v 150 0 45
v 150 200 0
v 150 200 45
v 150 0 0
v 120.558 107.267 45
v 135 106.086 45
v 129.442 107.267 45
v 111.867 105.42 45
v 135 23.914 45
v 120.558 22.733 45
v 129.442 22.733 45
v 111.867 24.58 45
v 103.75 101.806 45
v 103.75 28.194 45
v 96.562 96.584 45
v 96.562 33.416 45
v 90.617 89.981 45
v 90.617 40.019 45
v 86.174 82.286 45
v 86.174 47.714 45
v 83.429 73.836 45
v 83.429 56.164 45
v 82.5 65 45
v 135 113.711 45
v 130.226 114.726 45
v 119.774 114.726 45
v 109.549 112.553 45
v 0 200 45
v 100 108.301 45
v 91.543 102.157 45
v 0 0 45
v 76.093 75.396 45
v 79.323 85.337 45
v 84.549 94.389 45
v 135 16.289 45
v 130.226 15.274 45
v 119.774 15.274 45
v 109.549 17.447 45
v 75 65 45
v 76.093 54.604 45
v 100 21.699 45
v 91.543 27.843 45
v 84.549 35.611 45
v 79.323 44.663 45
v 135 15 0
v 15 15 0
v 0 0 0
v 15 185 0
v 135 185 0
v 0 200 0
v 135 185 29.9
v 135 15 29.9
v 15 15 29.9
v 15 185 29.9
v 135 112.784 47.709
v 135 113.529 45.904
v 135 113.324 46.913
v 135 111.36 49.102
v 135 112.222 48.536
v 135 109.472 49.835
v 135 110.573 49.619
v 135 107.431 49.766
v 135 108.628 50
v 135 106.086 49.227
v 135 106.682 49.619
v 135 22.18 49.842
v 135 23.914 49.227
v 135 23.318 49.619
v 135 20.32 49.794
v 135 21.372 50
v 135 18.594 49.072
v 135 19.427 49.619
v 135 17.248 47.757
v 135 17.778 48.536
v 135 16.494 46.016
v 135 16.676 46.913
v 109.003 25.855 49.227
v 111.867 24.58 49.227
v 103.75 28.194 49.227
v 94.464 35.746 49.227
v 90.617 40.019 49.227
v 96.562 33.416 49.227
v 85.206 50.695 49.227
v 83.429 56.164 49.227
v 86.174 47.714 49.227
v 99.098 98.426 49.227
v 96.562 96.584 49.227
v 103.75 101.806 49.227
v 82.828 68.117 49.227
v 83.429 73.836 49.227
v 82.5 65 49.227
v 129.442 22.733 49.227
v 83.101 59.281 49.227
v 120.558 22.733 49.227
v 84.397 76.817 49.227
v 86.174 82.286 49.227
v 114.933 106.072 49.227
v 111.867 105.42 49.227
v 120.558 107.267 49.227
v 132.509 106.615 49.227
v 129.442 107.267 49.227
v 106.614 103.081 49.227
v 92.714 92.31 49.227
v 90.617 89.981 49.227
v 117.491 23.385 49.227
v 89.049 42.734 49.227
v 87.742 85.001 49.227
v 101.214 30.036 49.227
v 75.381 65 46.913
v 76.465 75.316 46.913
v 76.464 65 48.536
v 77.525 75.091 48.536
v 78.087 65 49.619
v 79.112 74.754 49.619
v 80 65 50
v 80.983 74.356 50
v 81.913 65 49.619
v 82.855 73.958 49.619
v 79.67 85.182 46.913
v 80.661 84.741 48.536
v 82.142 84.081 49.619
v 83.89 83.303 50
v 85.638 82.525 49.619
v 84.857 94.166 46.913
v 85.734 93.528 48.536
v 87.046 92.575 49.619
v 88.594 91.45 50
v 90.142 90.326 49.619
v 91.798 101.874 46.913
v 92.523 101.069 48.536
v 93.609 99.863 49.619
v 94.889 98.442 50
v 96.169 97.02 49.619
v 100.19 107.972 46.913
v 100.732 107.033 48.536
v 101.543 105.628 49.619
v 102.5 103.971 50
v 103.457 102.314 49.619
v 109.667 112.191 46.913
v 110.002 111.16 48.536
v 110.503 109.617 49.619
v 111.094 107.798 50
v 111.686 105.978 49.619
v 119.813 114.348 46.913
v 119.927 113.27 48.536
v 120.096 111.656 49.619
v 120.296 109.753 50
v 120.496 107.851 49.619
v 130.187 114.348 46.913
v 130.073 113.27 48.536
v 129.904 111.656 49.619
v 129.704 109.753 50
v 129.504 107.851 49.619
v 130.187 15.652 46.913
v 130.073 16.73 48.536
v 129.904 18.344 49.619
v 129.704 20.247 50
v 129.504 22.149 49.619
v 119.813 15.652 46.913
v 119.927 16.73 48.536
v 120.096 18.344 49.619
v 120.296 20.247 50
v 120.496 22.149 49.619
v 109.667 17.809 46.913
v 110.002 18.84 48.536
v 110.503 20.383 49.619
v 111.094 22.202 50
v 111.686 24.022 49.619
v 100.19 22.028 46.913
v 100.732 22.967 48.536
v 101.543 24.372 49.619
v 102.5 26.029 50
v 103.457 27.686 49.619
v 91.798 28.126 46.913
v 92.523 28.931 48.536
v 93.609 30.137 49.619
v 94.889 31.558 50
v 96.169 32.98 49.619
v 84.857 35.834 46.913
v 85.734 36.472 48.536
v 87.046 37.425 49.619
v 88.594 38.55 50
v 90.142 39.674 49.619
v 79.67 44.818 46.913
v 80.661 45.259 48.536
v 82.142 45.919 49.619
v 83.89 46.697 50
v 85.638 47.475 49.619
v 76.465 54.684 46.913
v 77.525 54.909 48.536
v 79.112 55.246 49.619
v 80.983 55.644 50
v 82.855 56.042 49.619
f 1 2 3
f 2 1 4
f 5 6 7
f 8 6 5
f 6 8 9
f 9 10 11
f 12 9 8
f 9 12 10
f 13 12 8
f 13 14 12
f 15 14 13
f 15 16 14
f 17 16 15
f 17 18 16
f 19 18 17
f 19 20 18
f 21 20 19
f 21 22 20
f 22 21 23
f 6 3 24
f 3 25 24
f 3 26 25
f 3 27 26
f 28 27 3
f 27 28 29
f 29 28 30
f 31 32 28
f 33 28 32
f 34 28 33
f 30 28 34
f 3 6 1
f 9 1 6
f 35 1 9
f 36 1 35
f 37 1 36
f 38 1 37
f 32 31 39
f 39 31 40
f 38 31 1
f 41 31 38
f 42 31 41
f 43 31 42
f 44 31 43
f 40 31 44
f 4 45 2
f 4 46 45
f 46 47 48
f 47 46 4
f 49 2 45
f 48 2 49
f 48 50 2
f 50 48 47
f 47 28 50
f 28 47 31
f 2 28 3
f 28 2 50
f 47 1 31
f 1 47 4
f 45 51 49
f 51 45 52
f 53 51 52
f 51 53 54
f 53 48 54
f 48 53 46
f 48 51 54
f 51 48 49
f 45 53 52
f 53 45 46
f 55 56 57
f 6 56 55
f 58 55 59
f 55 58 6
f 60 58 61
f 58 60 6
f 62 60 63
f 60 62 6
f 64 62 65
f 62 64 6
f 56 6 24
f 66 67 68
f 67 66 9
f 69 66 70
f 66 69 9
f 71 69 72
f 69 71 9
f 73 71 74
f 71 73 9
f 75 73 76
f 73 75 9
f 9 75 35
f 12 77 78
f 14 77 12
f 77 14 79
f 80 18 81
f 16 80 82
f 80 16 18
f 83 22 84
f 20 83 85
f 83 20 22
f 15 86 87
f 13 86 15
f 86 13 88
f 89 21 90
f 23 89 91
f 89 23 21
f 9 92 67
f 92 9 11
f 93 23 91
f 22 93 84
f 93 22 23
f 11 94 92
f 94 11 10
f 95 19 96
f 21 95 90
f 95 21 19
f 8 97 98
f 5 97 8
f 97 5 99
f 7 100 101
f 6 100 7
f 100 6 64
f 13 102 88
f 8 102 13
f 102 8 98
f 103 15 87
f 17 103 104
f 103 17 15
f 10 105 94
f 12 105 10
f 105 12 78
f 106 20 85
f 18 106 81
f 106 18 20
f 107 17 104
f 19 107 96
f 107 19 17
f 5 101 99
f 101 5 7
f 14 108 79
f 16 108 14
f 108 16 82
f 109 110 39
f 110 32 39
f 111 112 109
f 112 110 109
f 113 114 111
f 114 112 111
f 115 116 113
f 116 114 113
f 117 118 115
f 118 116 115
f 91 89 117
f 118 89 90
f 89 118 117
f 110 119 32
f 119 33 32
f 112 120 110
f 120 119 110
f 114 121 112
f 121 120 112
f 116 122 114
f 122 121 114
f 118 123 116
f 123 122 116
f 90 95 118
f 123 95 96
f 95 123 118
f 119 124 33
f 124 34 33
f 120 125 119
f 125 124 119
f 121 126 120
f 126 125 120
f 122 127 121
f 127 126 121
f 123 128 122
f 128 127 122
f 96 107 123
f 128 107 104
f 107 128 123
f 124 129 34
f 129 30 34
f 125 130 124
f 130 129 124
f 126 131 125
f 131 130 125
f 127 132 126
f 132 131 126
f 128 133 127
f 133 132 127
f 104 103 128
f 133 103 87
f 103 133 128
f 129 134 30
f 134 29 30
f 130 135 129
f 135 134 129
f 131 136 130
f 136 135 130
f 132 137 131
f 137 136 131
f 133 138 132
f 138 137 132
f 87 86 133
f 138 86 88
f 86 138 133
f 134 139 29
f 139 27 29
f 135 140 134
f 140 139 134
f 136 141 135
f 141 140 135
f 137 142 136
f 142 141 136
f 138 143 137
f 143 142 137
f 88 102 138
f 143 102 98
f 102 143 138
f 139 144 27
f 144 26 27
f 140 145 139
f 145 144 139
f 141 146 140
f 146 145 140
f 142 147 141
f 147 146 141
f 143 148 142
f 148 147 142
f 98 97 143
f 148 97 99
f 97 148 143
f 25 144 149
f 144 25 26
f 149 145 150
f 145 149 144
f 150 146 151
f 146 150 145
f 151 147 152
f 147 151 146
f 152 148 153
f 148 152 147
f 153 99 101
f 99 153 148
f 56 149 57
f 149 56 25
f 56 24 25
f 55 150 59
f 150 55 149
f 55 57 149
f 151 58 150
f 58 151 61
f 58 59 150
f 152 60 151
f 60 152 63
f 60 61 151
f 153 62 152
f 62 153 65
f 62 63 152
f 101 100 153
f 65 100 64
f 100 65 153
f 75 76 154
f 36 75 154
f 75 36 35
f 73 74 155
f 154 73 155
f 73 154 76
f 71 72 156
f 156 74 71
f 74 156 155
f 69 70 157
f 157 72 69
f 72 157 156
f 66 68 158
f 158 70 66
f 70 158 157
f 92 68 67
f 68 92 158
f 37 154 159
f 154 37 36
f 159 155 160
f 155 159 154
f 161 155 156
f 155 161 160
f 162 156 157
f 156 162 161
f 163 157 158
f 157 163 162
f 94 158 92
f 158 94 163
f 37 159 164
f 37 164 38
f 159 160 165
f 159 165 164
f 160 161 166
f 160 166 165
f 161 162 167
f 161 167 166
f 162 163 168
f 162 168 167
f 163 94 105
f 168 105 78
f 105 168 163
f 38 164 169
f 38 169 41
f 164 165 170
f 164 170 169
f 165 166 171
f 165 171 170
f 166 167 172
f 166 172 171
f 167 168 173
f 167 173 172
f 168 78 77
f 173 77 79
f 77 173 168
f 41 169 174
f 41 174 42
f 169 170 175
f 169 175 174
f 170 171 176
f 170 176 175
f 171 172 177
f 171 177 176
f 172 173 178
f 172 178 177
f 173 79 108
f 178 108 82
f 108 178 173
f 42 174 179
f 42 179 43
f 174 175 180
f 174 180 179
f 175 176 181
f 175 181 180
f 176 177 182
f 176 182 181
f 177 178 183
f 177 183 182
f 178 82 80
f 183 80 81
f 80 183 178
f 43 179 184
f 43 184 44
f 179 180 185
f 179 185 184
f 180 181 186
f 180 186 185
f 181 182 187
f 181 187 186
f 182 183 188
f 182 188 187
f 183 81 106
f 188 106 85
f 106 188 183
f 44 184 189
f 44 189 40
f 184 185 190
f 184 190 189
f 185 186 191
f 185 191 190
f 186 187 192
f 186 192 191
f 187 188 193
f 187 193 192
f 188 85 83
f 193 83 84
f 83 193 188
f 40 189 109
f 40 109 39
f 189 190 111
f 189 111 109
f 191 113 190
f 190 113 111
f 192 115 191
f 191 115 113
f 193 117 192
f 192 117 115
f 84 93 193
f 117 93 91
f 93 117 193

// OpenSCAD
// file: microservo_SG90.scad
module microservo_SG90() {
    color("blue") 
    {
        union() {
            cube(size=[22.5, 12, 24.01]);

            translate([-5, 0, 0]) {
                cube(size=[32.4, 12, 19], center=false);    
            }
        
            translate([6, 6, 24]) {
                cylinder(r=6, h=24-22.5, center=false,  $fn = 100);
            }
            
            translate([12, 6, 24]) {
                cylinder(r=3, h=24-22.5, center=false,  $fn = 100);
            }
        }
    }
}
// main file
include <microservo_SG90.scad>

//$fa = 1;
//$fs = 0.4;

module counterProfile() {
    translate([-10, 0, 0]) {
        difference() {
            rotate_extrude(angle=360) {
            // wheel_radius = 50
            // tyre_diameter = 10
            translate([50 - 10/2, 5])
                circle(d=10);
            }

            union() {
                translate([10, -55, -2.5])
                    cube([40, 110, 25]);

                translate([0, 0, -1])
                    cylinder(r=42.5, h=25);
            }
        }
    }
}


union() {
    // base
    difference() {
        cube([150, 200, 45]);
        
        translate([15, 15, -0.1])
            cube([120, 170, 30]);
    }

    translate([135, 65, 40])
        counterProfile();
}
